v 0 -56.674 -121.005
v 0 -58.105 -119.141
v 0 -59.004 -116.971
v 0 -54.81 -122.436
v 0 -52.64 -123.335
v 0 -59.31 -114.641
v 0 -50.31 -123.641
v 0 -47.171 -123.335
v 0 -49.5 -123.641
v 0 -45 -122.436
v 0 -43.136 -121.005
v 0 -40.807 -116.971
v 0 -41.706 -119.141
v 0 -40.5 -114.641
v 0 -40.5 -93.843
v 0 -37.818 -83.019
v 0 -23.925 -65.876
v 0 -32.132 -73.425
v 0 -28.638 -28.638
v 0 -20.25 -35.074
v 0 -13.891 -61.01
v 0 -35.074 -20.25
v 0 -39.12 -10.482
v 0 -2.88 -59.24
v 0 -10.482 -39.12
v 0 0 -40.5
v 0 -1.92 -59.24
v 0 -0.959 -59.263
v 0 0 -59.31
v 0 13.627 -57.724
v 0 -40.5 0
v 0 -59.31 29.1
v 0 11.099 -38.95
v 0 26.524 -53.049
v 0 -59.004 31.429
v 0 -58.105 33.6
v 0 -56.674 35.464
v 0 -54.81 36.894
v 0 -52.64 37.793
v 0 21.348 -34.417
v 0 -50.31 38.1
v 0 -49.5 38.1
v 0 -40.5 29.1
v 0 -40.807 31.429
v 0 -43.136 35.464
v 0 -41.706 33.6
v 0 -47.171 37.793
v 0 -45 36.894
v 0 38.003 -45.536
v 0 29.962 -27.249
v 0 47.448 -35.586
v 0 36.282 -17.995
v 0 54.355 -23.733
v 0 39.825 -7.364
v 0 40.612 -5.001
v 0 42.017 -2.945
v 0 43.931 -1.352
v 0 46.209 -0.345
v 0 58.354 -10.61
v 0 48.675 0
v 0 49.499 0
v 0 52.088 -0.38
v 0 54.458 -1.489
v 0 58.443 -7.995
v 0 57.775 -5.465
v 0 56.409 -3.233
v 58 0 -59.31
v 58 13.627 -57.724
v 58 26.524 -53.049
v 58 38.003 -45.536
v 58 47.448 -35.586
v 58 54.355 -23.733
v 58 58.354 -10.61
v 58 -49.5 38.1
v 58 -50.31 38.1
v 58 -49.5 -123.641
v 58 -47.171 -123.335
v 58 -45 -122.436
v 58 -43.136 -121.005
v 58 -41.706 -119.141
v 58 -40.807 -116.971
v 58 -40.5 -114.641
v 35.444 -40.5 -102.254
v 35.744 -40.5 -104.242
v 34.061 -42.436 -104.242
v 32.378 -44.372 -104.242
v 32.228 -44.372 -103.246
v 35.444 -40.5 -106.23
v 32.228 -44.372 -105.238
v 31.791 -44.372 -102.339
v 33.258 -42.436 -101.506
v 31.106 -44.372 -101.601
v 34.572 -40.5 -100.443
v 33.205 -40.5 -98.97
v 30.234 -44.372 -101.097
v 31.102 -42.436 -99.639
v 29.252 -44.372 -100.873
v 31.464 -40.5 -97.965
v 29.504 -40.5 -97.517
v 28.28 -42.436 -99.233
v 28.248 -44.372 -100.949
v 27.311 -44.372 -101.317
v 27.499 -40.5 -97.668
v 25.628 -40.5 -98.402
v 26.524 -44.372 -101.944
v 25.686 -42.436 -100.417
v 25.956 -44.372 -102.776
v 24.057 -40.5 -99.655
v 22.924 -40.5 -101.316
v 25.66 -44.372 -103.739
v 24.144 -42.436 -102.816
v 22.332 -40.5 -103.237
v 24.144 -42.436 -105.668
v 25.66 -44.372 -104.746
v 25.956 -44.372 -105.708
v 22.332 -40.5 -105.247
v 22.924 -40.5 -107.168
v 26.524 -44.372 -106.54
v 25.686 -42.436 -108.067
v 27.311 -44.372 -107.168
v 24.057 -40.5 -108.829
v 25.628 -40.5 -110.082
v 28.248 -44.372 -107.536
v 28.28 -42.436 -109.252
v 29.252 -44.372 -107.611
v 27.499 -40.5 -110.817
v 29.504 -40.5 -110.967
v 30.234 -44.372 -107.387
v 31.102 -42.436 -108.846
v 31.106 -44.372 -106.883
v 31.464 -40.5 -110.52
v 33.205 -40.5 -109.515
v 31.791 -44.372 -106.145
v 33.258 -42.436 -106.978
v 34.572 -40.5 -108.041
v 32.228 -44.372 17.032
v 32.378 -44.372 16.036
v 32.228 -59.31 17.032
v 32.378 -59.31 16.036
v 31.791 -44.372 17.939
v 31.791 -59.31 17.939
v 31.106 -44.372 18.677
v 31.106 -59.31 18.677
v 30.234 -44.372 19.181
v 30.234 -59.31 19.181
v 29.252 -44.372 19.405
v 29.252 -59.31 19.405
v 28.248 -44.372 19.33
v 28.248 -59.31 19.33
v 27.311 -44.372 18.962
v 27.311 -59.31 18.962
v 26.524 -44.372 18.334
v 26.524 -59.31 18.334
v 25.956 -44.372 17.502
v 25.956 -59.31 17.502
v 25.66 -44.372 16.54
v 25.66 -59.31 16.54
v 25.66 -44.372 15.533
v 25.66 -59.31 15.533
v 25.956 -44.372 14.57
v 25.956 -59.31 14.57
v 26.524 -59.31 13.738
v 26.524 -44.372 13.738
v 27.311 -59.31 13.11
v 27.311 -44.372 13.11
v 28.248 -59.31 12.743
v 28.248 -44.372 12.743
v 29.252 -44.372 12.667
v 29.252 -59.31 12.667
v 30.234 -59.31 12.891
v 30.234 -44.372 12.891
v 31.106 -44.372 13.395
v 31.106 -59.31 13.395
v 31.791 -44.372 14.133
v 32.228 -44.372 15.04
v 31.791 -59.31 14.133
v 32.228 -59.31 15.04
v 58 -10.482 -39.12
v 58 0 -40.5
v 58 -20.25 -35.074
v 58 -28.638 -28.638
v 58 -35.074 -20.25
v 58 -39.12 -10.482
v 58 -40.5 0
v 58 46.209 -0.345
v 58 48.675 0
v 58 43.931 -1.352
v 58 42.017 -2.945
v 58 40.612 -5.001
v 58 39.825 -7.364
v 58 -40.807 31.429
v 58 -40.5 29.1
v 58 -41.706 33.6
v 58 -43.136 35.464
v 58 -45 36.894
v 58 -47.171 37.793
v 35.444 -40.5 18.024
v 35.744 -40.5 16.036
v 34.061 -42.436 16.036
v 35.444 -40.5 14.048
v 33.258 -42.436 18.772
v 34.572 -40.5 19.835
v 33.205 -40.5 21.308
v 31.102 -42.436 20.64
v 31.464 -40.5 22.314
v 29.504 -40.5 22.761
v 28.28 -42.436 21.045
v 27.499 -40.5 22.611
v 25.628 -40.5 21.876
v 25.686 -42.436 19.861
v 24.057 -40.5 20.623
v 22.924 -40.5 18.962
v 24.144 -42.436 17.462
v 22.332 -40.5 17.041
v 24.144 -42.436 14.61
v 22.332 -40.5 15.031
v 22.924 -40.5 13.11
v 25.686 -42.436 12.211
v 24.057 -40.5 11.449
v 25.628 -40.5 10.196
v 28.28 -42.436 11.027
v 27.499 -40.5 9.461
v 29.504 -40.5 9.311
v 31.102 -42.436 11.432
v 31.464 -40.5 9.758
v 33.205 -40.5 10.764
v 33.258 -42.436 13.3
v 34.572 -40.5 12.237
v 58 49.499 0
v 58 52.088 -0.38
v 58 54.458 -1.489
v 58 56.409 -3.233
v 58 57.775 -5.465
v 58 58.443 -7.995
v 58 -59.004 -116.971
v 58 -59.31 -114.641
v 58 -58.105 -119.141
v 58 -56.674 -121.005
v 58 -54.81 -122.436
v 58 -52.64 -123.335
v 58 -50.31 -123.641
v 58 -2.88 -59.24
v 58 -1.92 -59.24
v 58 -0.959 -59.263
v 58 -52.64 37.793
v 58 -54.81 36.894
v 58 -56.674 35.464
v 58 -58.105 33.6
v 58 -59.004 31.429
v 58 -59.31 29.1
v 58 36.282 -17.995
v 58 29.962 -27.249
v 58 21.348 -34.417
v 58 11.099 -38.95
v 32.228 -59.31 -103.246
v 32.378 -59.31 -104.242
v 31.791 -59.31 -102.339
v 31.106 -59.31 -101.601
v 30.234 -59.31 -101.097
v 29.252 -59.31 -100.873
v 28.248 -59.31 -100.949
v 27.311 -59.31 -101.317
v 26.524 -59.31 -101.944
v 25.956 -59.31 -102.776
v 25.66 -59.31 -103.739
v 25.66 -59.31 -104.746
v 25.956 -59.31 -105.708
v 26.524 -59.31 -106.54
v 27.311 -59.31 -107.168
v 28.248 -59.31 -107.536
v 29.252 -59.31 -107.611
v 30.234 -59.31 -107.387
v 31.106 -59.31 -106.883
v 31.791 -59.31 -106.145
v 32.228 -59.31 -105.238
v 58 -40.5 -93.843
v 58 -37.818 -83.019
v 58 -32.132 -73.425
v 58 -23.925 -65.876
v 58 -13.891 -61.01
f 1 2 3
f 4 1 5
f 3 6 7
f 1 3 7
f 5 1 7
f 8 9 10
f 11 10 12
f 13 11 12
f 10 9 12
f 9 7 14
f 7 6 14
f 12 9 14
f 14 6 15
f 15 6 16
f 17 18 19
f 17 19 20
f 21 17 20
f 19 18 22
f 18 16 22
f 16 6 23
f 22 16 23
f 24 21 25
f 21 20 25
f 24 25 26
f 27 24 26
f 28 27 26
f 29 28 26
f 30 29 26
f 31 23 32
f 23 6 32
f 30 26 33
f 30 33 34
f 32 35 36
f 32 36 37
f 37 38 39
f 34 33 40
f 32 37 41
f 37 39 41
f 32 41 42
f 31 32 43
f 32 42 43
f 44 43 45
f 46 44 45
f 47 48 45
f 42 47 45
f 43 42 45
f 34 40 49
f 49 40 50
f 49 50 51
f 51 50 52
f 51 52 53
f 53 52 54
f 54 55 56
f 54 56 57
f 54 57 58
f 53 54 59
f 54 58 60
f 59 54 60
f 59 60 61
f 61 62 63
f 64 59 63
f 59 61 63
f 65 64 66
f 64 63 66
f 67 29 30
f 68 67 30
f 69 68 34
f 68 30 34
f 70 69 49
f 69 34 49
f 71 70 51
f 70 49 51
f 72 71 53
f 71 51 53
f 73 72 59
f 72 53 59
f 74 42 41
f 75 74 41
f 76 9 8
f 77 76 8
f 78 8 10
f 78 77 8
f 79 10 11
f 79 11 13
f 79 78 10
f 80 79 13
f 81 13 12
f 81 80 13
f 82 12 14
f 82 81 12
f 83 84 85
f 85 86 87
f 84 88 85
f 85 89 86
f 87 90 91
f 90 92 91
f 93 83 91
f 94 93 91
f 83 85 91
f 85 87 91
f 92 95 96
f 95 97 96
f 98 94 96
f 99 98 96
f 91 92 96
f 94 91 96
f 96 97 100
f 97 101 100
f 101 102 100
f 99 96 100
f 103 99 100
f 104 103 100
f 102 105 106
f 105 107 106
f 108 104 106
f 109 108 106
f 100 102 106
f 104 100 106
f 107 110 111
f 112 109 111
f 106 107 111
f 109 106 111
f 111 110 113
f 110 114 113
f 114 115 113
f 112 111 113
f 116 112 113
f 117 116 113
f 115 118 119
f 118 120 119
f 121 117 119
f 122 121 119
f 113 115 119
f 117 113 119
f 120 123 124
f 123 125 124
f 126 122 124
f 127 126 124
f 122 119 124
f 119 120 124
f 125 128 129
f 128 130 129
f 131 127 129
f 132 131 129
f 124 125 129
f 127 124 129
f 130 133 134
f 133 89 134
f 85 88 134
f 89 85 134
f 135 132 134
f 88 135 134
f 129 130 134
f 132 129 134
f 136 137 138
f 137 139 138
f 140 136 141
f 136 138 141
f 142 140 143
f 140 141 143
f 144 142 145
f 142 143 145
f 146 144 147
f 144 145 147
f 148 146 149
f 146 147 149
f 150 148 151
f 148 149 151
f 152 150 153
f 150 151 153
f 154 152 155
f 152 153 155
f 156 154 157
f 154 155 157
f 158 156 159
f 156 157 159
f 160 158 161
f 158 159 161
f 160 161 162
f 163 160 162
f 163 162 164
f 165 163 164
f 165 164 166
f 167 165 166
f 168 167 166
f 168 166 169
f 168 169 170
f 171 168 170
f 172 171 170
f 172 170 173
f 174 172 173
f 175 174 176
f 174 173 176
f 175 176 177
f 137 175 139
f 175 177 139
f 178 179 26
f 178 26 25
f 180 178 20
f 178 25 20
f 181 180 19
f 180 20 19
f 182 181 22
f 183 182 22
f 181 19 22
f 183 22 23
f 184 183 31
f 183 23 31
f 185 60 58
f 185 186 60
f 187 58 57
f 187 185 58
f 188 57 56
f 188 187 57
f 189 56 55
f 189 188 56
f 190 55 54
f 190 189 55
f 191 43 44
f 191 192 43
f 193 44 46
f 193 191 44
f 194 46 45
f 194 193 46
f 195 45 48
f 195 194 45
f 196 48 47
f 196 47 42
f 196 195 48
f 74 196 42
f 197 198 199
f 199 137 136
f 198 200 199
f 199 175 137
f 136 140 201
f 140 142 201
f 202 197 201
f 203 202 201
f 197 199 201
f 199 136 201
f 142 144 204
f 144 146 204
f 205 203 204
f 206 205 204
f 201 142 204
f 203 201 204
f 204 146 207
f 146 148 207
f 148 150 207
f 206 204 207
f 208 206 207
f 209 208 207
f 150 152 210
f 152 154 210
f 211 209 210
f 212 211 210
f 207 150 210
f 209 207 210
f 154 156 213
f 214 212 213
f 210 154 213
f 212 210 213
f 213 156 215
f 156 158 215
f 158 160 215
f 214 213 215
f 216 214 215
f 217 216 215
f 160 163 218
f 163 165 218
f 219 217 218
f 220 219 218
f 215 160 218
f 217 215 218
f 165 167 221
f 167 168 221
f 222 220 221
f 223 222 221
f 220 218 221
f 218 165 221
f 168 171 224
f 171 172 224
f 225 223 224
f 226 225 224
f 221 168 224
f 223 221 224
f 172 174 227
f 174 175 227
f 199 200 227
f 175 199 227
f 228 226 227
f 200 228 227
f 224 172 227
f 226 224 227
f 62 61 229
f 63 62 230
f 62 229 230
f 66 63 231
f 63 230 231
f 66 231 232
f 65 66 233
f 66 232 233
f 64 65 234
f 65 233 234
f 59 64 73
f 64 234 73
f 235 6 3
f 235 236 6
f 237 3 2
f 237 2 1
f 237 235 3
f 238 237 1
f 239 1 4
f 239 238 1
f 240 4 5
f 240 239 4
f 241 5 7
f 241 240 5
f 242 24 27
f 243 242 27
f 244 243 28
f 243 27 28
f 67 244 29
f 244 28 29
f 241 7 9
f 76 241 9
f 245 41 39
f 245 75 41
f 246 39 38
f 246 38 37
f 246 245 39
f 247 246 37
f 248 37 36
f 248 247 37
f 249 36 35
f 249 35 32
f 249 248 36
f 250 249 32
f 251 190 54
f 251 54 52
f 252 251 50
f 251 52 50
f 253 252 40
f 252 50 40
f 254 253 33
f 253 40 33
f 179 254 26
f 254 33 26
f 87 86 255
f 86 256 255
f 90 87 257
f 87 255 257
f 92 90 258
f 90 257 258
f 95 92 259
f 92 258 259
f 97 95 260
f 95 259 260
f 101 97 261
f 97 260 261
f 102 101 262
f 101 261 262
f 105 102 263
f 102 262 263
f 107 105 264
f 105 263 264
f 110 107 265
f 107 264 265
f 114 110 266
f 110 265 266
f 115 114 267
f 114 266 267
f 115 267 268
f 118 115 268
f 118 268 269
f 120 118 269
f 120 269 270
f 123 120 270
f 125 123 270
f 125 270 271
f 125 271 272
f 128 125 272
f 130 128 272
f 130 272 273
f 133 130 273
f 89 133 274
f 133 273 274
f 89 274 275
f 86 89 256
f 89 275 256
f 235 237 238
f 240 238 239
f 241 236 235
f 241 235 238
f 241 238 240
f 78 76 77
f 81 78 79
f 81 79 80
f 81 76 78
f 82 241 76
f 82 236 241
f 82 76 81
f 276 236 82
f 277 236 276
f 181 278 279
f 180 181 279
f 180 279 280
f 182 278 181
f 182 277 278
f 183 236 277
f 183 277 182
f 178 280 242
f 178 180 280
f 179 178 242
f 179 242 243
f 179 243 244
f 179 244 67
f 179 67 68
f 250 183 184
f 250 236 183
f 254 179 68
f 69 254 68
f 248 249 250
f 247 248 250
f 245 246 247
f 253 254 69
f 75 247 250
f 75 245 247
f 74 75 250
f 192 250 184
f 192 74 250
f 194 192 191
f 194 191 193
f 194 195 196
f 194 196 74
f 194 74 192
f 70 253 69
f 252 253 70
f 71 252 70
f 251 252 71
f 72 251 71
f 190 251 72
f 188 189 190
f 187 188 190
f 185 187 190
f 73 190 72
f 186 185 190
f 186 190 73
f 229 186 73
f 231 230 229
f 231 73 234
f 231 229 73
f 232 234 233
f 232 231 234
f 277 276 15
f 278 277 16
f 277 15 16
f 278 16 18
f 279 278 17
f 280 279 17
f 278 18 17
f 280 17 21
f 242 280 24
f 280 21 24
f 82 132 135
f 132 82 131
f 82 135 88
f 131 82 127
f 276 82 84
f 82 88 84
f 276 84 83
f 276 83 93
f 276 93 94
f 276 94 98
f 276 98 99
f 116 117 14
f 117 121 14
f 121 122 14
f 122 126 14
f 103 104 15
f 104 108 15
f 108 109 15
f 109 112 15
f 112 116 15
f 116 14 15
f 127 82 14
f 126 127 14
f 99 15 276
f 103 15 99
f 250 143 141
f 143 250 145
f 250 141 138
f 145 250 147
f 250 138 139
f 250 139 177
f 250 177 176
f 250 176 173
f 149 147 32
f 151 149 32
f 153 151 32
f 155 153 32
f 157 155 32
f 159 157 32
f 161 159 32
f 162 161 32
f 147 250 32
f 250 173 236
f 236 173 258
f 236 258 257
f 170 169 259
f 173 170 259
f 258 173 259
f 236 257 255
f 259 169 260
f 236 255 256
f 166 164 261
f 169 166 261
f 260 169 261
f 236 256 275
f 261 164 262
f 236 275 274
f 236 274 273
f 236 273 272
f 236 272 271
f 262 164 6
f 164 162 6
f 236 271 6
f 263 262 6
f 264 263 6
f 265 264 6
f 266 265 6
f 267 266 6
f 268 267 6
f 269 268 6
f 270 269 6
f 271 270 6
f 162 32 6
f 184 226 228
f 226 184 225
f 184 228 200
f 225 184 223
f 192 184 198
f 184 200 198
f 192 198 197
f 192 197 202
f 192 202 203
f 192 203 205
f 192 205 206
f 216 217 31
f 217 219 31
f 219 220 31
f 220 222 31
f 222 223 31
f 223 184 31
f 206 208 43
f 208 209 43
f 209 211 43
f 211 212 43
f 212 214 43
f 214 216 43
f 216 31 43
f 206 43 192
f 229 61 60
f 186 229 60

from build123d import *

# Parameters (mm, degrees)
F1_DEPTH       = 58
F2_R           = 9
F4_D           = 6.7564
F4_DEPTH       = 127
F4_CSINK_D     = 13.4874
F4_CSINK_ANGLE = 82
F4_TIP         = 2.0298273432


# Not quite as in the source:
# - a feature names something its author has since deleted; it is built from what else it names


with BuildPart() as f1:
    # F0 (on Right) → F1 (new body)
    with BuildSketch(Plane.YZ):
        with BuildLine():
            Line((59.3103850067, 0), (40.5, 0))
            ThreePointArc((40.5, 0), (28.6378246381, -28.6378246381), (0, -40.5))
            ThreePointArc((0, -40.5), (-28.6378246381, -28.6378246381), (-40.5, 0))
            Line((-40.5, 0), (-40.5, -43.3298023263))
            ThreePointArc((-40.5, -43.3298023263), (-23.1030418264, -54.62573778), (-2.8803521713, -59.2404029443))
            ThreePointArc((-2.8803521713, -59.2404029443), (-1.4395179453, -59.2483059491), (0, -59.3103850067))
            ThreePointArc((0, -59.3103850067), (41.938775433, -41.938775433), (59.3103850067, 0))
        make_face()
        with BuildLine():
            Line((-40.5, -43.3298023263), (-40.5, 0))
            Line((-40.5, 0), (-59.3103850067, 0))
            ThreePointArc((-59.3103850067, 0), (-54.4049279129, -23.6183316184), (-40.5, -43.3298023263))
        make_face()
        with BuildLine():
            Line((-59.3103850067, 0), (-40.5, 0))
            Line((-40.5, 0), (-40.5, 38.1))
            Line((-40.5, 38.1), (-45.4545021933, 38.1))
            ThreePointArc((-45.4545021933, 38.1), (-55.7388813801, 20.2706406444), (-59.3103850067, 0))
        make_face()
        with BuildLine():
            Line((-59.3103850067, 38.1), (-59.3103850067, 0))
            ThreePointArc((-59.3103850067, 0), (-55.7388813801, 20.2706406444), (-45.4545021933, 38.1))
            Line((-45.4545021933, 38.1), (-59.3103850067, 38.1))
        make_face()
        with BuildLine():
            ThreePointArc((-40.5, -43.3298023263), (-54.4049279129, -23.6183316184), (-59.3103850067, 0))
            Line((-59.3103850067, 0), (-59.3103850067, -123.6414313316))
            Line((-59.3103850067, -123.6414313316), (-40.5, -123.6414313316))
            Line((-40.5, -123.6414313316), (-40.5, -93.8428338624))
            Line((-40.5, -93.8428338624), (-40.5, -43.3298023263))
        make_face()
        with BuildLine():
            ThreePointArc((-2.8803521713, -59.2404029443), (-23.1030418264, -54.62573778), (-40.5, -43.3298023263))
            Line((-40.5, -43.3298023263), (-40.5, -93.8428338624))
            ThreePointArc((-40.5, -93.8428338624), (-28.3045630471, -69.3504788941), (-2.8803521713, -59.2404029443))
        make_face()
    extrude(amount=F1_DEPTH)

    # F2
    f2_edges = [f1.edges().sort_by_distance(p)[0] for p in [
        (29, -40.5, 38.1),
        (29, -59.310385, 38.1),
        (29, 59.310385, 0),
        (29, 40.5, 0),
        (29, -40.5, -123.641431),
        (29, -59.310385, -123.641431),
    ]]
    fillet(f2_edges, radius=F2_R)

    # F4
    with Locations(Plane(origin=(0, -40.5, 0), x_dir=(-1, 0, 0), z_dir=(0, 1, 0))):
        with Locations((-29, 16.0360112786), (-29, -104.242132597)):
            CounterSinkHole(F4_D / 2, F4_CSINK_D / 2, depth=F4_DEPTH, counter_sink_angle=F4_CSINK_ANGLE)
            with Locations((0, 0, -(F4_DEPTH + F4_TIP / 2))):  # 118° drill point
                Cone(0, F4_D / 2, F4_TIP, mode=Mode.SUBTRACT)


solid = f1.part
